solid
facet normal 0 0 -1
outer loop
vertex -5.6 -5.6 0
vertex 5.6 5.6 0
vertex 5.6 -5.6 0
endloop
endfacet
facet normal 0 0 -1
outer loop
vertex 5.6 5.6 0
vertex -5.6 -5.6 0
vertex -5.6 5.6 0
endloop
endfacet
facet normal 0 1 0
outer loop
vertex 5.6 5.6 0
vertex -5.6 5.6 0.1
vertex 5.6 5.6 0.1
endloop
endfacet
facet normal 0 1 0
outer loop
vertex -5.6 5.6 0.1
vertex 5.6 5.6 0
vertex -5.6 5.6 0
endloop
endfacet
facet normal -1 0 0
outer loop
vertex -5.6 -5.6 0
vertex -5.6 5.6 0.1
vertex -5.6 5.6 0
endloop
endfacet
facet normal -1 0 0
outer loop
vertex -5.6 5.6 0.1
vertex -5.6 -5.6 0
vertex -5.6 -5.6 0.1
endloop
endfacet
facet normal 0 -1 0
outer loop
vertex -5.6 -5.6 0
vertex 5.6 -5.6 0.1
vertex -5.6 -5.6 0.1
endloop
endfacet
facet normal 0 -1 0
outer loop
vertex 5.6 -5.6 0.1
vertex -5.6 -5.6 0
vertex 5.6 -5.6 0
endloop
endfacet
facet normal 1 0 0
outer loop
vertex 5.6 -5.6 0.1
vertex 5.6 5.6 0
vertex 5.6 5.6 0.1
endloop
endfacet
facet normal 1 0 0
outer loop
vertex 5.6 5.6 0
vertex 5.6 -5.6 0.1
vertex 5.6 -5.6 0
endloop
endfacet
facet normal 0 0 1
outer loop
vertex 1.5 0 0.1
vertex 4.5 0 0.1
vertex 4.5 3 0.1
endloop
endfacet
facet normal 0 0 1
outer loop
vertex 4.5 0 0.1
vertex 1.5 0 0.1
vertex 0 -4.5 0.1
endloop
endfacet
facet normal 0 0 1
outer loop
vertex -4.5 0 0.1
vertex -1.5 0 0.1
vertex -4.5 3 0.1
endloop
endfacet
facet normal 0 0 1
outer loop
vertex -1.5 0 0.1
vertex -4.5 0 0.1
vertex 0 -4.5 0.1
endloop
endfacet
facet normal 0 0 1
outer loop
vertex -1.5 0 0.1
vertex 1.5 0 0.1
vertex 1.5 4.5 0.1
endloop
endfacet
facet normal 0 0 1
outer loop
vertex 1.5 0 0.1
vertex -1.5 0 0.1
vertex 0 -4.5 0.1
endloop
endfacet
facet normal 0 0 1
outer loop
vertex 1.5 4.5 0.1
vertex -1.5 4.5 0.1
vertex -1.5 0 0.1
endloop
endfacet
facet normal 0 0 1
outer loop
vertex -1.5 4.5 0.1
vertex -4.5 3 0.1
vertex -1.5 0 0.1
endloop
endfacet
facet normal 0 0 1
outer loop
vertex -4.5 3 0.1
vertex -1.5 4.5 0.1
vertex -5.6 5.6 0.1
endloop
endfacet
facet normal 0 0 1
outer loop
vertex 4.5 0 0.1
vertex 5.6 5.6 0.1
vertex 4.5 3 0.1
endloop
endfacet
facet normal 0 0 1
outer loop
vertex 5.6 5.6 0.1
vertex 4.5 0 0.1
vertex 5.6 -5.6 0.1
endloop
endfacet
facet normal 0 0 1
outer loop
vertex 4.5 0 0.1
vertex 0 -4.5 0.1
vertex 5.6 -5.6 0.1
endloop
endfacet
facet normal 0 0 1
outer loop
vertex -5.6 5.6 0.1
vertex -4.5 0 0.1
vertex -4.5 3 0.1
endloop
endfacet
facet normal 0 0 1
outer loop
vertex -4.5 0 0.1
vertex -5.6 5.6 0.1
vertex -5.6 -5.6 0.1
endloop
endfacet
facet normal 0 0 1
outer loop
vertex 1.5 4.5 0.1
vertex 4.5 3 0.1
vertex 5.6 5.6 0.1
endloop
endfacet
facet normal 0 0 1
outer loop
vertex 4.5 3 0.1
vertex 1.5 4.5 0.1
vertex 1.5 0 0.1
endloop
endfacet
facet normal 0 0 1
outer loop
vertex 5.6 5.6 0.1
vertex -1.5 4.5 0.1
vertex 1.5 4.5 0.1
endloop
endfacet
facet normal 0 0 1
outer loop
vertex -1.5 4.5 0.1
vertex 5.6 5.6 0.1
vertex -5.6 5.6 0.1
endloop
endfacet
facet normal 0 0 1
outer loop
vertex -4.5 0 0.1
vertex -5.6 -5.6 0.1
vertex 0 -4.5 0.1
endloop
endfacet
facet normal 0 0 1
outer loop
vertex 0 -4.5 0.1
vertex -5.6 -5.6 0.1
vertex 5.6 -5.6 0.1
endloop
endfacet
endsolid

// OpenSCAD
// file: ../p/box5-12.scad
use <../lib.scad>
function ldraw_lib__box5_12() = [
// 0 Box with 5 Faces without Any Edges
// 0 Name: box5-12.dat
// 0 Author: Chris Dee [cwdee]
// 0 !LDRAW_ORG Primitive UPDATE 2009-02
// 0 !LICENSE Licensed under CC BY 4.0 : see CAreadme.txt
// 
// 0 BFC CERTIFY CCW
  [0,"BFC","CERTIFY"],
  [0,"BFC","CCW"],
// 
// 0 !HISTORY 2009-09-03 [PTadmin] Official Update 2009-02
// 
// 
// 4 16 1 1 1 1 1 -1 -1 1 -1 -1 1 1
  [4,16,1,1,1,1,1,-1,-1,1,-1,-1,1,1],
// 4 16 -1 0 1 1 0 1 1 1 1 -1 1 1
  [4,16,-1,0,1,1,0,1,1,1,1,-1,1,1],
// 4 16 -1 0 -1 -1 0 1 -1 1 1 -1 1 -1
  [4,16,-1,0,-1,-1,0,1,-1,1,1,-1,1,-1],
// 4 16 1 0 -1 -1 0 -1 -1 1 -1 1 1 -1
  [4,16,1,0,-1,-1,0,-1,-1,1,-1,1,1,-1],
// 4 16 1 0 1 1 0 -1 1 1 -1 1 1 1
  [4,16,1,0,1,1,0,-1,1,1,-1,1,1,1],
// 0
];
module ldraw_lib__box5_12(step=0, col=false, unit=2/5, alt=false, line=0.2, solid=!$preview)
    makepoly(ldraw_lib__box5_12(), step=step, col=col, unit=unit, alt=alt, line=line, solid=solid);
ldraw_lib__box5_12(line=0.2);
// main file
use <../lib.scad>
use <../p/box5-12.scad>
function ldraw_lib__193445j() = [
// 0 Sticker  1.4 x  1.4 with Black Down Arrow on Yellow Background
// 0 Name: 193445j.dat
// 0 Author: Takeshi Takahashi [RainbowDolphin]
// 0 !LDRAW_ORG Part UPDATE 2022-05
// 0 !LICENSE Licensed under CC BY 4.0 : see CAreadme.txt
// 
// 0 BFC CERTIFY CCW
  [0,"BFC","CERTIFY"],
  [0,"BFC","CCW"],
// 
// 0 !KEYWORDS Construction, Public works, Set 6383
// 
// 0 !HISTORY 2022-09-15 [PTadmin] Official Update 2022-05
// 
// 
// 1 16 0 -0.25 0 14 0 0 0 0.25 0 0 0 14 box5-12.dat
  [1,16,0,-0.25,0,14,0,0,0,0.25,0,0,0,14, ldraw_lib__box5_12()],
// 4 0 0 -0.25 -11.25 11.25 -0.25 0 11.25 -0.25 7.5 3.75 -0.25 0
  [4,0,0,-0.25,-11.25,11.25,-0.25,0,11.25,-0.25,7.5,3.75,-0.25,0],
// 4 0 0 -0.25 -11.25 -3.75 -0.25 0 -11.25 -0.25 7.5 -11.25 -0.25 0
  [4,0,0,-0.25,-11.25,-3.75,-0.25,0,-11.25,-0.25,7.5,-11.25,-0.25,0],
// 4 0 -3.75 -0.25 0 0 -0.25 -11.25 3.75 -0.25 0 3.75 -0.25 11.25
  [4,0,-3.75,-0.25,0,0,-0.25,-11.25,3.75,-0.25,0,3.75,-0.25,11.25],
// 3 0 3.75 -0.25 11.25 -3.75 -0.25 11.25 -3.75 -0.25 0
  [3,0,3.75,-0.25,11.25,-3.75,-0.25,11.25,-3.75,-0.25,0],
// 4 14 -3.75 -0.25 11.25 -14 -0.25 14 -11.25 -0.25 7.5 -3.75 -0.25 0
  [4,14,-3.75,-0.25,11.25,-14,-0.25,14,-11.25,-0.25,7.5,-3.75,-0.25,0],
// 4 14 14 -0.25 14 11.25 -0.25 7.5 11.25 -0.25 0 14 -0.25 -14
  [4,14,14,-0.25,14,11.25,-0.25,7.5,11.25,-0.25,0,14,-0.25,-14],
// 3 14 11.25 -0.25 0 0 -0.25 -11.25 14 -0.25 -14
  [3,14,11.25,-0.25,0,0,-0.25,-11.25,14,-0.25,-14],
// 4 14 -14 -0.25 -14 -11.25 -0.25 0 -11.25 -0.25 7.5 -14 -0.25 14
  [4,14,-14,-0.25,-14,-11.25,-0.25,0,-11.25,-0.25,7.5,-14,-0.25,14],
// 4 14 3.75 -0.25 11.25 3.75 -0.25 0 11.25 -0.25 7.5 14 -0.25 14
  [4,14,3.75,-0.25,11.25,3.75,-0.25,0,11.25,-0.25,7.5,14,-0.25,14],
// 4 14 -14 -0.25 14 -3.75 -0.25 11.25 3.75 -0.25 11.25 14 -0.25 14
  [4,14,-14,-0.25,14,-3.75,-0.25,11.25,3.75,-0.25,11.25,14,-0.25,14],
// 3 14 -11.25 -0.25 0 -14 -0.25 -14 0 -0.25 -11.25
  [3,14,-11.25,-0.25,0,-14,-0.25,-14,0,-0.25,-11.25],
// 3 14 0 -0.25 -11.25 -14 -0.25 -14 14 -0.25 -14
  [3,14,0,-0.25,-11.25,-14,-0.25,-14,14,-0.25,-14],
];
module ldraw_lib__193445j(step=0, col=false, unit=2/5, alt=false, line=0.2, solid=!$preview)
    makepoly(ldraw_lib__193445j(), step=step, col=col, unit=unit, alt=alt, line=line, solid=solid);
ldraw_lib__193445j(line=0.2);
